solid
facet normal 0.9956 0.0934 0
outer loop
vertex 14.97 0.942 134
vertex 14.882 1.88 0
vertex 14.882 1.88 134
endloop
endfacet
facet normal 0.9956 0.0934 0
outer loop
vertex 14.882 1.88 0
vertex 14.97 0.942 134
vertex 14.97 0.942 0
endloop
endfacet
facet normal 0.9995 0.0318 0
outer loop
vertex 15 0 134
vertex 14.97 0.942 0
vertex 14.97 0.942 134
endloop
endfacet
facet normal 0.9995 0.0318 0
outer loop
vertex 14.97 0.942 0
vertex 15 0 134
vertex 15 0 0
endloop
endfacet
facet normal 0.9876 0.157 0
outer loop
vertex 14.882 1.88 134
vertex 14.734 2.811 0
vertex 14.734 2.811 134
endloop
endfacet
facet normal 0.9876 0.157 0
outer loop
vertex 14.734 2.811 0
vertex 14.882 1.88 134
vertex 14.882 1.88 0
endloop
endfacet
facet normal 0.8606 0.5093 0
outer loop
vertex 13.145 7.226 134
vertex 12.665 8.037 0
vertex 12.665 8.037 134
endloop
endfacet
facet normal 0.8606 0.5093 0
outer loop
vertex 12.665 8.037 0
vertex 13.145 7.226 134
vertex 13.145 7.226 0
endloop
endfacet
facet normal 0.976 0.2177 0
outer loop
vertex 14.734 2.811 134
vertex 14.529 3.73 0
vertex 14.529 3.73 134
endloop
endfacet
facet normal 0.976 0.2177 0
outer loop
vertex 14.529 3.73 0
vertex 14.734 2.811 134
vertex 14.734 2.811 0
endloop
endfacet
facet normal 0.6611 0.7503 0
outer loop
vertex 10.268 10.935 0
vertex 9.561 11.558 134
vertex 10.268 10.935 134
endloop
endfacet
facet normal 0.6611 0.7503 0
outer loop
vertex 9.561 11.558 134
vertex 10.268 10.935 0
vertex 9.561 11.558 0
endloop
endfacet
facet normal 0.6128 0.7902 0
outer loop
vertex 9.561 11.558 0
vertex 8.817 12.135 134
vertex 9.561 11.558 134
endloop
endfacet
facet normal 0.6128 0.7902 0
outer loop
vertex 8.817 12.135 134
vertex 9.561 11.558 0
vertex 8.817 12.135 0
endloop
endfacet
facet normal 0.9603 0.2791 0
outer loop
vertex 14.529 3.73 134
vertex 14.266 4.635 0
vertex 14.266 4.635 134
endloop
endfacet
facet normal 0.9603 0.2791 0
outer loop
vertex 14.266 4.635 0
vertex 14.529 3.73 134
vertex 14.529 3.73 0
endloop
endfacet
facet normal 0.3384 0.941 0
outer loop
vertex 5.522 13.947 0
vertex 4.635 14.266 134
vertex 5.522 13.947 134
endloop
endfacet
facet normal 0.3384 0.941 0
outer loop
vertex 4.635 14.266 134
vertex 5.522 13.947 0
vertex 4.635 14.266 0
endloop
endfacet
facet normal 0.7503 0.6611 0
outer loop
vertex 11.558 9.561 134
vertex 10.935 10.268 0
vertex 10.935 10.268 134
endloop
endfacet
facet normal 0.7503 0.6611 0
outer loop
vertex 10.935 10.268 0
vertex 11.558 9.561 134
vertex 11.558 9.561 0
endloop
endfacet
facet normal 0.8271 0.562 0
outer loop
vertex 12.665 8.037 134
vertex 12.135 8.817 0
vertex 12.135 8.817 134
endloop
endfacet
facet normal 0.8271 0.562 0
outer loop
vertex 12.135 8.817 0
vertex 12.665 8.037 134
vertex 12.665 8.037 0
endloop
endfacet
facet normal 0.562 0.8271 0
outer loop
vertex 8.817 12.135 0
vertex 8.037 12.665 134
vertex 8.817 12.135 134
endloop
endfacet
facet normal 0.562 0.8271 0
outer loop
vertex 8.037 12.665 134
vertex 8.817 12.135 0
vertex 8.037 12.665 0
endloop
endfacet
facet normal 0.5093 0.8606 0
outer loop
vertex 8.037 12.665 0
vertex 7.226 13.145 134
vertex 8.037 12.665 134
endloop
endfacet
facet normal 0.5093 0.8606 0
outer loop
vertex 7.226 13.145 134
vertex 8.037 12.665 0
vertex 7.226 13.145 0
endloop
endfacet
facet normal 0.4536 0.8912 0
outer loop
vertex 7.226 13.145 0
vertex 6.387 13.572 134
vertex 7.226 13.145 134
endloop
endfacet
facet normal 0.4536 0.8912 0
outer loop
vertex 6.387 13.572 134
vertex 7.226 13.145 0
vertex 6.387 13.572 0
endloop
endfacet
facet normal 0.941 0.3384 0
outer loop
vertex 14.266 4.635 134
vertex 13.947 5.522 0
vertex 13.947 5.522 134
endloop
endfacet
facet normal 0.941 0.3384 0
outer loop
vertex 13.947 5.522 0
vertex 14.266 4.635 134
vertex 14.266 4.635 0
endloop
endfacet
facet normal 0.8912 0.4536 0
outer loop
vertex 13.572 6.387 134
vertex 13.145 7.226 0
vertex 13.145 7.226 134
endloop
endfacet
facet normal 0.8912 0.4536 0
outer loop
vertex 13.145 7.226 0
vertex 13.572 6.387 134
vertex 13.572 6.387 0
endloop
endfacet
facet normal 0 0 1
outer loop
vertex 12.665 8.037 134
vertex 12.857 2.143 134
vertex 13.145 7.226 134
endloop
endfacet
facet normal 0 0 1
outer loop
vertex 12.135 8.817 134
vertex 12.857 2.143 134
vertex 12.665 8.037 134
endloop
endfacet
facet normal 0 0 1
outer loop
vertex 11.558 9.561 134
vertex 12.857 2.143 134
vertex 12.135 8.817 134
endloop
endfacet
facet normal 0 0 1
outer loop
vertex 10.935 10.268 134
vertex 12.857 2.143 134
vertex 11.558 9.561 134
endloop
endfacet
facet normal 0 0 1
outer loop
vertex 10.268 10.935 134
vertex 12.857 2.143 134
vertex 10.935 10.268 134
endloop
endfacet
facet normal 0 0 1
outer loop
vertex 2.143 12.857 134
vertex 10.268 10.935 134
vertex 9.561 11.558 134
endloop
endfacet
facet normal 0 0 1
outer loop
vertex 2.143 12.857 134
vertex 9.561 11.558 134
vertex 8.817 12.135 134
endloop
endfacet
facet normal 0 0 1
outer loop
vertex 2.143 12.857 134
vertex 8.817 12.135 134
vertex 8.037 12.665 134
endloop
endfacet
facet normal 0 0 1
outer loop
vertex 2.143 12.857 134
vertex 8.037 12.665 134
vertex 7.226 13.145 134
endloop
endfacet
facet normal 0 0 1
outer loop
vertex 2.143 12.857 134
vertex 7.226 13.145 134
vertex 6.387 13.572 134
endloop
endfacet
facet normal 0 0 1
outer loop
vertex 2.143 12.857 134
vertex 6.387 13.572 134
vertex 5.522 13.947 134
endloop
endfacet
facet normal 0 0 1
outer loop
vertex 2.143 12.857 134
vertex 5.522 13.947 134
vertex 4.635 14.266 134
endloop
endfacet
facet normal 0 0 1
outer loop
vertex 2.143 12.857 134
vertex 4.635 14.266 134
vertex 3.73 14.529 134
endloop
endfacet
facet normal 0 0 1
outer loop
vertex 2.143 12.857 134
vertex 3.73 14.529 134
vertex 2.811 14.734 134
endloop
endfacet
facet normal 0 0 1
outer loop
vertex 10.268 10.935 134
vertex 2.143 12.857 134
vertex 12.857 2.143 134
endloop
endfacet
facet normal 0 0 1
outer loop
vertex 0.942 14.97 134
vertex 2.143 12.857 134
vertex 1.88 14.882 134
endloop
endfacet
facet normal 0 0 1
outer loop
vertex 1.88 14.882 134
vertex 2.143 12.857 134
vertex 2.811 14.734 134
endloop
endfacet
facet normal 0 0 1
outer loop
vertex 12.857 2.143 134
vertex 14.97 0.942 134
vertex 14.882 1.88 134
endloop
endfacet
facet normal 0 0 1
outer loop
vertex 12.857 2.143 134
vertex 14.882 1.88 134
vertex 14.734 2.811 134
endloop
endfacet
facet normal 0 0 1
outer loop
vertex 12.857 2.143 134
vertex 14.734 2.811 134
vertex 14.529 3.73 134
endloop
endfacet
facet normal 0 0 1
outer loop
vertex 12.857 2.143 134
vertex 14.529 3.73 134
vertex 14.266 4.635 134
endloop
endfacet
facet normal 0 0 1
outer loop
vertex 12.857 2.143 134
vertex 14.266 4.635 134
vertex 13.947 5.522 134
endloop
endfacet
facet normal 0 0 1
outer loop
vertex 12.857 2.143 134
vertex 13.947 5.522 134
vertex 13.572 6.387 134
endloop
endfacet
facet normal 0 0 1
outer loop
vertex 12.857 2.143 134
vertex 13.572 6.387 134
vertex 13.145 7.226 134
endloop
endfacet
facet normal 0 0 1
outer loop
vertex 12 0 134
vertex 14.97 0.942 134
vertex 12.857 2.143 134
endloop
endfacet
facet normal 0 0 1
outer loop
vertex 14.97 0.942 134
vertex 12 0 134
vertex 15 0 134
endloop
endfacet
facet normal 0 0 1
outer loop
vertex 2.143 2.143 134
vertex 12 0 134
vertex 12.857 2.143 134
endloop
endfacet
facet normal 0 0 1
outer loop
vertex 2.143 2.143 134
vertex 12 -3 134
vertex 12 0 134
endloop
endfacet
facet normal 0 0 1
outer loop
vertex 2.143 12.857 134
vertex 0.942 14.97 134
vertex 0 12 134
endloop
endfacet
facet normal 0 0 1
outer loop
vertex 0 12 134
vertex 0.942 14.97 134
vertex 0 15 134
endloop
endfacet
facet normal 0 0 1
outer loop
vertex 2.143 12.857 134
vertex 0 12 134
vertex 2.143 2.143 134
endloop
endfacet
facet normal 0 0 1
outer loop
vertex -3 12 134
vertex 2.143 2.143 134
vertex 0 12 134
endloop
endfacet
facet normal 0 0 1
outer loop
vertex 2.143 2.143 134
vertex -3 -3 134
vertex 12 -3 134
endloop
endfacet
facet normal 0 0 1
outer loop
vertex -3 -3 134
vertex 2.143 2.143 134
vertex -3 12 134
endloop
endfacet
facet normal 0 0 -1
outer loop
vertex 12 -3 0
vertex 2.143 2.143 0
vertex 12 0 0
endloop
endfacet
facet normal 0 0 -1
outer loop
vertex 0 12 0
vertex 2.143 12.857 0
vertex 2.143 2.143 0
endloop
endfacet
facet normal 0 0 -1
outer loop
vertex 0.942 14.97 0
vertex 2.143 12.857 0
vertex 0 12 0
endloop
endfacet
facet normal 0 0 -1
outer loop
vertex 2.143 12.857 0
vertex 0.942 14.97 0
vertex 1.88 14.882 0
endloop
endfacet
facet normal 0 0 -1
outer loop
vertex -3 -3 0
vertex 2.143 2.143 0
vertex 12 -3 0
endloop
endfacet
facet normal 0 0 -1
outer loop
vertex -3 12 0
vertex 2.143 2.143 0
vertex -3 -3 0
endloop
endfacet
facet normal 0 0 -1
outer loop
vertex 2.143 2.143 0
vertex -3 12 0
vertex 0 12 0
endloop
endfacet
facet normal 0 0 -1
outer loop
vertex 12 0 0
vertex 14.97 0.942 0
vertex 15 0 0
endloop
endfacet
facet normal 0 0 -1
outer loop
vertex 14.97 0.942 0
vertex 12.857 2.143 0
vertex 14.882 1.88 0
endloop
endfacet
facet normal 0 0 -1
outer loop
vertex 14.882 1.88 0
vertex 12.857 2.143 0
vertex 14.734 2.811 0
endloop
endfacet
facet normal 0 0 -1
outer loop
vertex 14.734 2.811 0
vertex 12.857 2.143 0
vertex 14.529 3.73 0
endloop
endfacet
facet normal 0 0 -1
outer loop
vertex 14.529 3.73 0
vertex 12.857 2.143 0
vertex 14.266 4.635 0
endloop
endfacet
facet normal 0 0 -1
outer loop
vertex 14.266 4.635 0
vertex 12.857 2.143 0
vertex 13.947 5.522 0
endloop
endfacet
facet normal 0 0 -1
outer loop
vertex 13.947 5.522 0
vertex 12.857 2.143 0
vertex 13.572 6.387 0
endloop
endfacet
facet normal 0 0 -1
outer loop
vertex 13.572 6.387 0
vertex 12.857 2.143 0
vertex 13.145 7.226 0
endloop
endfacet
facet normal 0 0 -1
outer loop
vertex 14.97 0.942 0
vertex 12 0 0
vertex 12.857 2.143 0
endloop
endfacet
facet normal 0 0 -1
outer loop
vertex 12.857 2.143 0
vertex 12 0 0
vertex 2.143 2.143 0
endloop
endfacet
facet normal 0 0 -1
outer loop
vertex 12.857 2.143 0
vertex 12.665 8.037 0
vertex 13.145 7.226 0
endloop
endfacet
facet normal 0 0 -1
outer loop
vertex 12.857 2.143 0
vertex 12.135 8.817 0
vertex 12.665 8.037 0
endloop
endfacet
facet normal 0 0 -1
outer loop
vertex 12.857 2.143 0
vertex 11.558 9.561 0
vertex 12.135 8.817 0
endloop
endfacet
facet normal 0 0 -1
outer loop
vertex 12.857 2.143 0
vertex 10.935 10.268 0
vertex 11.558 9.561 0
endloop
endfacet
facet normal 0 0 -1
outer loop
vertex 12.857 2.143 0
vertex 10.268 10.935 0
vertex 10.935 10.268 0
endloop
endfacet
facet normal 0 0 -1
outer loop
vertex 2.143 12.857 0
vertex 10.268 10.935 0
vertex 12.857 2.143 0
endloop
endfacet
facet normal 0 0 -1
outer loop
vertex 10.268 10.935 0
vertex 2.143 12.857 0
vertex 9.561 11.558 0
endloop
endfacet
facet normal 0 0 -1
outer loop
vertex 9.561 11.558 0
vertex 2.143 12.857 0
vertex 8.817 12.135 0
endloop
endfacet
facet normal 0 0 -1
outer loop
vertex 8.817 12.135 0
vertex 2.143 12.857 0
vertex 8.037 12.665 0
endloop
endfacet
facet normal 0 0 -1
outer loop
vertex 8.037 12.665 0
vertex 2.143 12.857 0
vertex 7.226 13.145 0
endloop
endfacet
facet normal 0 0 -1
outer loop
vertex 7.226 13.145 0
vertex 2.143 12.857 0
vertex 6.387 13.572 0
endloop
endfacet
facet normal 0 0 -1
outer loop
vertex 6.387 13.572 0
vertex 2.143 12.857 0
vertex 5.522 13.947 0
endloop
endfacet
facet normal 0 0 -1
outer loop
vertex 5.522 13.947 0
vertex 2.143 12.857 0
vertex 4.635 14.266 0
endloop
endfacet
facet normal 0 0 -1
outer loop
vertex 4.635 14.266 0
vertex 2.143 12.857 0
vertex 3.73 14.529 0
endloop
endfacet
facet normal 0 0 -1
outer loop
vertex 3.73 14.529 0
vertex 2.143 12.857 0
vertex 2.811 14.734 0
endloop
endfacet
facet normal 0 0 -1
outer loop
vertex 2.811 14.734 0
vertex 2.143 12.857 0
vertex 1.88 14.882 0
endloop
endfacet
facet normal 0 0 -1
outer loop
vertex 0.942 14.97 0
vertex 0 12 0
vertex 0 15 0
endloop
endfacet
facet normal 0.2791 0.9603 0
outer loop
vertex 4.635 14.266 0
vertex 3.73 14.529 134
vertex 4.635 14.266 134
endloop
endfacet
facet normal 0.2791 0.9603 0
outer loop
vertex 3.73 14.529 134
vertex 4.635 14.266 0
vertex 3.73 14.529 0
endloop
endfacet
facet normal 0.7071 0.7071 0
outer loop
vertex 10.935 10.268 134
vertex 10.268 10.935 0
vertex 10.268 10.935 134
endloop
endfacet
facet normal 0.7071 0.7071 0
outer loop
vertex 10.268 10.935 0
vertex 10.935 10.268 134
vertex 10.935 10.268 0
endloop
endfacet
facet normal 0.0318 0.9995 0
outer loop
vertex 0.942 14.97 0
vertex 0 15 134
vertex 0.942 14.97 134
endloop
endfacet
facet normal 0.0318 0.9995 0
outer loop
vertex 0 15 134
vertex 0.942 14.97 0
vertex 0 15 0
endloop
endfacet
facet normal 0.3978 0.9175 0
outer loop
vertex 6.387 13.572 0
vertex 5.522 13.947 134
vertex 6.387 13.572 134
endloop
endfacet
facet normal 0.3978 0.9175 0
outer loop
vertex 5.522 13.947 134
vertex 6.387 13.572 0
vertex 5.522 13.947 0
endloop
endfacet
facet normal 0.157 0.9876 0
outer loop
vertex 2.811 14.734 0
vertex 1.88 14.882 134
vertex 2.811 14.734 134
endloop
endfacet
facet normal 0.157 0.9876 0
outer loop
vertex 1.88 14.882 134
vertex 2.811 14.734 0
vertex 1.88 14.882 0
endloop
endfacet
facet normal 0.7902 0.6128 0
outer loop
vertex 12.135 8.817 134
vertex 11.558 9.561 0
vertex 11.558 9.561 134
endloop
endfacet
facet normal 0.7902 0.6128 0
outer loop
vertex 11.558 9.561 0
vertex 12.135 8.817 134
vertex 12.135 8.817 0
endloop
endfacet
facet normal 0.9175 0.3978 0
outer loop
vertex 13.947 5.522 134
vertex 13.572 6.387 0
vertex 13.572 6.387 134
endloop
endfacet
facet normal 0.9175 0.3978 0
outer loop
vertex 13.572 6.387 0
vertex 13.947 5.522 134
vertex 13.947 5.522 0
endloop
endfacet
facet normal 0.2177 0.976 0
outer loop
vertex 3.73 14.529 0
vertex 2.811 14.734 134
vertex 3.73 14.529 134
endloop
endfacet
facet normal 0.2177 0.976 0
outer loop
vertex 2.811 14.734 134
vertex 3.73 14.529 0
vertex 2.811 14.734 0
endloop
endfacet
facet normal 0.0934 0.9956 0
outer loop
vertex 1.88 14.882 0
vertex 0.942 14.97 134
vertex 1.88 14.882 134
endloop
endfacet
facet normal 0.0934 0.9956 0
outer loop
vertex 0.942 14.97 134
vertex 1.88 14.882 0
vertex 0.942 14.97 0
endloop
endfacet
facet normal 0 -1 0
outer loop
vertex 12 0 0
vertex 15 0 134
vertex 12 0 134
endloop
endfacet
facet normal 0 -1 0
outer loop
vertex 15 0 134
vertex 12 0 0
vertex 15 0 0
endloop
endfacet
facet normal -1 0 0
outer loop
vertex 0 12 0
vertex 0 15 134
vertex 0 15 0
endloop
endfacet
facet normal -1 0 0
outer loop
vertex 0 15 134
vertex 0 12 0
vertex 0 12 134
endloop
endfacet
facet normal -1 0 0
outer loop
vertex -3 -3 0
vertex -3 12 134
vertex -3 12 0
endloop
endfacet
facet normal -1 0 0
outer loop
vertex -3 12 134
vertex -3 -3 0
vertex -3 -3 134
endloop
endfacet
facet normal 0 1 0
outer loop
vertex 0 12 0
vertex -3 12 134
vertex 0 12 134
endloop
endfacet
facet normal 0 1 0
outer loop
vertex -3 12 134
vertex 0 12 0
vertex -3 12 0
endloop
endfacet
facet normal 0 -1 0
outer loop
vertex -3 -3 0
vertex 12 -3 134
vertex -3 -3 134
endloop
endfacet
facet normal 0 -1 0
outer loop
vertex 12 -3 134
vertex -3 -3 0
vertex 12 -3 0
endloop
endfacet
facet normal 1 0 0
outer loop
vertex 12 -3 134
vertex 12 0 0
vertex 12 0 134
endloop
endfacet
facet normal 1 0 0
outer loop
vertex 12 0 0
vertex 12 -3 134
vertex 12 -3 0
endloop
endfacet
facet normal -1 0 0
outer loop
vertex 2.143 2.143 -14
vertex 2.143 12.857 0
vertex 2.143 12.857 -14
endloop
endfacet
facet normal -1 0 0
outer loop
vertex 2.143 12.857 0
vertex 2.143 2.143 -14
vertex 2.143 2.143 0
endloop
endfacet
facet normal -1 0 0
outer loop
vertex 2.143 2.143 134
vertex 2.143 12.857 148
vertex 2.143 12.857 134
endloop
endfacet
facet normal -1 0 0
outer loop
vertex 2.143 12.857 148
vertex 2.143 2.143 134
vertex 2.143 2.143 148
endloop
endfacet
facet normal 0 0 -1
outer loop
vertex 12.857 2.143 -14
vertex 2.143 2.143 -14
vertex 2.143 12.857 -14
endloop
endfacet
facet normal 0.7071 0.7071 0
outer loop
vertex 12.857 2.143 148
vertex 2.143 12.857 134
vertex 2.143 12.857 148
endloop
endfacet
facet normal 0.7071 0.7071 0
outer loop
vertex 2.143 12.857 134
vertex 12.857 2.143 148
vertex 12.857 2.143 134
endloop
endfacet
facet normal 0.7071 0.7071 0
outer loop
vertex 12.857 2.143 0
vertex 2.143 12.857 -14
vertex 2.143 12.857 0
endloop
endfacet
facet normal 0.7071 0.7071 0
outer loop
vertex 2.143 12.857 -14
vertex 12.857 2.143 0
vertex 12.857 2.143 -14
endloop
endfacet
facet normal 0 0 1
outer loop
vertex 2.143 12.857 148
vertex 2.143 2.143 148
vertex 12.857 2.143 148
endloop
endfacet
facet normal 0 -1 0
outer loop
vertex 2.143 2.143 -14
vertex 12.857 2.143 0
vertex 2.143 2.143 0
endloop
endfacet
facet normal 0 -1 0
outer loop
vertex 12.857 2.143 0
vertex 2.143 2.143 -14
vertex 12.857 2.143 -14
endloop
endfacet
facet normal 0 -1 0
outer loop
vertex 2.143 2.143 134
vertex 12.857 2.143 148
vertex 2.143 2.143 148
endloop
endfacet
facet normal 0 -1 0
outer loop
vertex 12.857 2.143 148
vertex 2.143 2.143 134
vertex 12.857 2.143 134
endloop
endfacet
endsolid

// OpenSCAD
// file: frame_connector.scad
$fn = 100;

radius = 15;
length = 90;
connector_margin = 3;

module frame_connector(radius, length, connector_margin) {
    connector_size = radius - 2*connector_margin;
    translate([connector_margin, connector_margin, 0])
    polyhedron(
        points=[[0,0,0], [0,connector_size,0], [0,connector_size,length], [0,0,length], [connector_size,0,0], [connector_size,0,length]],
        faces=[[0,1,2,3],[5,4,3,2],[0,4,5,1],[0,3,4],[5,2,1]]
    );
}

frame_connector(
    radius = radius,
    length = length,
    connector_margin = connector_margin
);
// main file
use <frame_connector.scad>
$fn = 100;

radius = 15;
size = 134;
wall_thickness = 3;
wall_bearing_surface = 3;

module frame_edge(radius, size, wall_thickness, wall_bearing_surface) {
    difference() {
        cylinder(r=radius, h=size);
        translate([-radius, -radius, -1]) cube([2*radius, radius, size+2]);
        translate([-radius, -1, -1]) cube([radius, 2*radius, size+2]);
    }
    translate([-wall_thickness, -wall_thickness, 0])
    cube([wall_bearing_surface, radius-wall_thickness+wall_bearing_surface, size]);

    translate([-wall_thickness, -wall_thickness, 0])
    cube([radius-wall_thickness+wall_bearing_surface, wall_bearing_surface, size]);

    translate([0, 0, -(radius-1)])
    frame_connector(
        radius = radius,
        length = size + 2*(radius-1),
        connector_margin = wall_thickness/1.4
    );
}

frame_edge(
    radius = radius,
    size = size,
    wall_thickness = wall_thickness,
    wall_bearing_surface = wall_bearing_surface
);
